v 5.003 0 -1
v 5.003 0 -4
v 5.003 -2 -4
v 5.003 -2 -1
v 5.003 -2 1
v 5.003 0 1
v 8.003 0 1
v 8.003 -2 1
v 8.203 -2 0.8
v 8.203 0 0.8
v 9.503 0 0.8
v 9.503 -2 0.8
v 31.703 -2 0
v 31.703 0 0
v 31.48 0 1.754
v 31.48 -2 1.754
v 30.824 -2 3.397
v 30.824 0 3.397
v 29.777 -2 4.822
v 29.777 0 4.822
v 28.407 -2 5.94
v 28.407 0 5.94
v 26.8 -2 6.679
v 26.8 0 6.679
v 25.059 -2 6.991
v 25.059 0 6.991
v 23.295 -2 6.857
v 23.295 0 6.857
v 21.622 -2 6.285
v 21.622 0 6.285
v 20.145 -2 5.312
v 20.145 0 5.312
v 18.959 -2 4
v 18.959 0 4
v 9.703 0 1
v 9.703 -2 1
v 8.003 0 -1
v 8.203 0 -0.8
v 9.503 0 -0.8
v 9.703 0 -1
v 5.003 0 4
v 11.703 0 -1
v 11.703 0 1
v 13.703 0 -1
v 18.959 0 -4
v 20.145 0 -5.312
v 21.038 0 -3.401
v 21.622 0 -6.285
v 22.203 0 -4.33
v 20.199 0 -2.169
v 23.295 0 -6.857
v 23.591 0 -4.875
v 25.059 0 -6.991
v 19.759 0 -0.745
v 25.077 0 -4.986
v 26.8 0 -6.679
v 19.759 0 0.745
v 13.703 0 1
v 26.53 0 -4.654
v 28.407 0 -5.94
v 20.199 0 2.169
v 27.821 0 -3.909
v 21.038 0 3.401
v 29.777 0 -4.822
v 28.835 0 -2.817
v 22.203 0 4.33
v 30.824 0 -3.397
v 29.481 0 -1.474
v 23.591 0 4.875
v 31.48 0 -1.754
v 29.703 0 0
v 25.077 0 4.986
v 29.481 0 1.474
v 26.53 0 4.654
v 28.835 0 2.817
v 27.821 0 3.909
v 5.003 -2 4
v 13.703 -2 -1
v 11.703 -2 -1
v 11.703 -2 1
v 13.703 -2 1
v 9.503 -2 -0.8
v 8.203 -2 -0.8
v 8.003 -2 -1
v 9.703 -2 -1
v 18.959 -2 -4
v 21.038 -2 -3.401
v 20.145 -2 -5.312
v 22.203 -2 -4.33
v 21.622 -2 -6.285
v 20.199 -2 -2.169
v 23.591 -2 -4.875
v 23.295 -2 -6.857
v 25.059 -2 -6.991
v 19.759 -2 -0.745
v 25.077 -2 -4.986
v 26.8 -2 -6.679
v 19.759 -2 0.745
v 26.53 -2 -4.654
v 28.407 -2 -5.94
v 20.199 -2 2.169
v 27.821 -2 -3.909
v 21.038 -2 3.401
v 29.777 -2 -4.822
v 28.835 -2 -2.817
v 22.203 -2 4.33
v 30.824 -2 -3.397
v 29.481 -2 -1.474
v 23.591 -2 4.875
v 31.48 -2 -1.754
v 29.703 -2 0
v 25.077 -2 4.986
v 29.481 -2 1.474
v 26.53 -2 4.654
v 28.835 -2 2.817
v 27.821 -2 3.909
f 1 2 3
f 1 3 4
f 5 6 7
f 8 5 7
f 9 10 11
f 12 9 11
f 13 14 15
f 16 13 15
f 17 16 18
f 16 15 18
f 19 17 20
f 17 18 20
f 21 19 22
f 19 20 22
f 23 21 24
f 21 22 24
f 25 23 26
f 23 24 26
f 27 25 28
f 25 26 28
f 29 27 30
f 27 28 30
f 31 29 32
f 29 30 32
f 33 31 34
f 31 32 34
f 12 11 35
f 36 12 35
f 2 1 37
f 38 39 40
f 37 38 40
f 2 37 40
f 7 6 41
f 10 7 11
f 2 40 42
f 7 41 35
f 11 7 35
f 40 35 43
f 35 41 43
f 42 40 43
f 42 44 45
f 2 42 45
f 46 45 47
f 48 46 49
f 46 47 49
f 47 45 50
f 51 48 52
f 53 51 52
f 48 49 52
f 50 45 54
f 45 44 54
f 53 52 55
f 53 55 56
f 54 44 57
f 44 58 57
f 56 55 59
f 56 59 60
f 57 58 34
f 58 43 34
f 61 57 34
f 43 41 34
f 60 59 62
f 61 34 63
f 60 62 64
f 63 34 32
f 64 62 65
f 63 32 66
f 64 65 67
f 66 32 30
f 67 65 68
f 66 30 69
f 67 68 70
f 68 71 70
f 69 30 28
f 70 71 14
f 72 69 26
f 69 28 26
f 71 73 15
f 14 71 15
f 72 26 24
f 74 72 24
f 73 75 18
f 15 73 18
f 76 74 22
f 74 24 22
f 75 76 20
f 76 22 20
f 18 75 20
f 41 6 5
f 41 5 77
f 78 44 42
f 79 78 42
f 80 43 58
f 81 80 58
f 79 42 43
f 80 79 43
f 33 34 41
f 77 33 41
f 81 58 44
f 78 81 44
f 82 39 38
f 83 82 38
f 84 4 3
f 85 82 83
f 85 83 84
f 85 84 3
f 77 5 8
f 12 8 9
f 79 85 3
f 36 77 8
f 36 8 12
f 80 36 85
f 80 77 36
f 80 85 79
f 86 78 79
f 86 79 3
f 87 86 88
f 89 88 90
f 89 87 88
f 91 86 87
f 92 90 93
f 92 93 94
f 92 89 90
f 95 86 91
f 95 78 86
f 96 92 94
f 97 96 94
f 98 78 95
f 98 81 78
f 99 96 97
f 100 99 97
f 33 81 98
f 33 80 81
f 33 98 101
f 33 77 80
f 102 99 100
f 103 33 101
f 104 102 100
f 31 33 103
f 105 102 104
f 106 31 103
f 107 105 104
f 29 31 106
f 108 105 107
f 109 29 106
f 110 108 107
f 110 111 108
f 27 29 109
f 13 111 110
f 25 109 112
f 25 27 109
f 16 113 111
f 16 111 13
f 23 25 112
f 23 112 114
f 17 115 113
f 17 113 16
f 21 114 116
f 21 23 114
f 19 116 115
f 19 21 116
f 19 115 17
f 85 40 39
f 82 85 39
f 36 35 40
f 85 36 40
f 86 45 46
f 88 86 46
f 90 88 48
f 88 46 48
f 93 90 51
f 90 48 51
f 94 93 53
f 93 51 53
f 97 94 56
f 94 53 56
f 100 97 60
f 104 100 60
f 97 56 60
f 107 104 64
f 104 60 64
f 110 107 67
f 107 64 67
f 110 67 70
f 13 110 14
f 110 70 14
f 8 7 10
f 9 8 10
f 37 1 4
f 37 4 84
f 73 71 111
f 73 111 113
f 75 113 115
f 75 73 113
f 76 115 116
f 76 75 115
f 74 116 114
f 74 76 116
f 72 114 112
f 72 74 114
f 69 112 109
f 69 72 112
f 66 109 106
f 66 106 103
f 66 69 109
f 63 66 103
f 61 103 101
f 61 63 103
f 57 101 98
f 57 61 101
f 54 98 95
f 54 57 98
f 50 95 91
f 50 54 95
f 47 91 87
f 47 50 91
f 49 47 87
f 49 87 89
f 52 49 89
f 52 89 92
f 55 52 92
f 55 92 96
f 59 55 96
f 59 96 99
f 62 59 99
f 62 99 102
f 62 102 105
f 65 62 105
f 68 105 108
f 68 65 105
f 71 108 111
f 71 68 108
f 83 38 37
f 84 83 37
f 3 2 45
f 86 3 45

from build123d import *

# Parameters (mm, degrees)
F0_R     = 5
F0_W     = 3
F0_H     = 3
F1_DEPTH = 2


with BuildPart() as f1:
    # F0 (on Front) → F1 (new body)
    with BuildSketch(Plane.XZ):
        with BuildLine():
            ThreePointArc((18.958906, -4), (26.799663, -6.67877), (31.703468, 0))
            ThreePointArc((31.703468, 0), (26.799663, 6.67877), (18.958906, 4))
            ThreePointArc((18.958906, 4), (18.191959, 2.569095), (17.775265, 1))
            ThreePointArc((17.775265, 1), (17.703468, 0), (17.775265, -1))
            ThreePointArc((17.775265, -1), (18.191959, -2.569095), (18.958906, -4))
        make_face()
        with Locations((24.703468, 0)):
            Circle(F0_R, mode=Mode.SUBTRACT)
        with BuildLine():
            ThreePointArc((17.775265, 1), (18.191959, 2.569095), (18.958906, 4))
            Line((18.958906, 4), (8.003468, 4))
            Line((8.003468, 4), (8.003468, 1))
            Line((8.003468, 1), (9.703468, 1))
            Line((9.703468, 1), (11.703468, 1))
            Line((11.703468, 1), (13.703468, 1))
            Line((13.703468, 1), (17.775265, 1))
        make_face()
        with BuildLine():
            ThreePointArc((17.775265, -1), (17.703468, 0), (17.775265, 1))
            Line((17.775265, 1), (13.703468, 1))
            Line((13.703468, 1), (13.703468, -1))
            Line((13.703468, -1), (17.775265, -1))
        make_face()
        Polygon((11.703468, -1), (11.703468, 1), (9.703468, 1), (9.703468, 0), (9.703468, -1), align=None)
        with BuildLine():
            Line((8.003468, -4), (18.958906, -4))
            ThreePointArc((18.958906, -4), (18.191959, -2.569095), (17.775265, -1))
            Line((17.775265, -1), (13.703468, -1))
            Line((13.703468, -1), (11.703468, -1))
            Line((11.703468, -1), (9.703468, -1))
            Line((9.703468, -1), (8.003468, -1))
            Line((8.003468, -1), (8.003468, -4))
        make_face()
        Polygon((8.203468, -0.8), (8.003468, -1), (9.703468, -1), (9.503468, -0.8), align=None)
        Polygon((9.703468, 1), (8.003468, 1), (8.203468, 0.8), (9.503468, 0.8), align=None)
        with Locations((6.503468, 2.5)):
            Rectangle(F0_W, F0_H)
        with Locations((6.503468, -2.5)):
            Rectangle(F0_W, F0_H)
    extrude(amount=F1_DEPTH)


solid = f1.part
